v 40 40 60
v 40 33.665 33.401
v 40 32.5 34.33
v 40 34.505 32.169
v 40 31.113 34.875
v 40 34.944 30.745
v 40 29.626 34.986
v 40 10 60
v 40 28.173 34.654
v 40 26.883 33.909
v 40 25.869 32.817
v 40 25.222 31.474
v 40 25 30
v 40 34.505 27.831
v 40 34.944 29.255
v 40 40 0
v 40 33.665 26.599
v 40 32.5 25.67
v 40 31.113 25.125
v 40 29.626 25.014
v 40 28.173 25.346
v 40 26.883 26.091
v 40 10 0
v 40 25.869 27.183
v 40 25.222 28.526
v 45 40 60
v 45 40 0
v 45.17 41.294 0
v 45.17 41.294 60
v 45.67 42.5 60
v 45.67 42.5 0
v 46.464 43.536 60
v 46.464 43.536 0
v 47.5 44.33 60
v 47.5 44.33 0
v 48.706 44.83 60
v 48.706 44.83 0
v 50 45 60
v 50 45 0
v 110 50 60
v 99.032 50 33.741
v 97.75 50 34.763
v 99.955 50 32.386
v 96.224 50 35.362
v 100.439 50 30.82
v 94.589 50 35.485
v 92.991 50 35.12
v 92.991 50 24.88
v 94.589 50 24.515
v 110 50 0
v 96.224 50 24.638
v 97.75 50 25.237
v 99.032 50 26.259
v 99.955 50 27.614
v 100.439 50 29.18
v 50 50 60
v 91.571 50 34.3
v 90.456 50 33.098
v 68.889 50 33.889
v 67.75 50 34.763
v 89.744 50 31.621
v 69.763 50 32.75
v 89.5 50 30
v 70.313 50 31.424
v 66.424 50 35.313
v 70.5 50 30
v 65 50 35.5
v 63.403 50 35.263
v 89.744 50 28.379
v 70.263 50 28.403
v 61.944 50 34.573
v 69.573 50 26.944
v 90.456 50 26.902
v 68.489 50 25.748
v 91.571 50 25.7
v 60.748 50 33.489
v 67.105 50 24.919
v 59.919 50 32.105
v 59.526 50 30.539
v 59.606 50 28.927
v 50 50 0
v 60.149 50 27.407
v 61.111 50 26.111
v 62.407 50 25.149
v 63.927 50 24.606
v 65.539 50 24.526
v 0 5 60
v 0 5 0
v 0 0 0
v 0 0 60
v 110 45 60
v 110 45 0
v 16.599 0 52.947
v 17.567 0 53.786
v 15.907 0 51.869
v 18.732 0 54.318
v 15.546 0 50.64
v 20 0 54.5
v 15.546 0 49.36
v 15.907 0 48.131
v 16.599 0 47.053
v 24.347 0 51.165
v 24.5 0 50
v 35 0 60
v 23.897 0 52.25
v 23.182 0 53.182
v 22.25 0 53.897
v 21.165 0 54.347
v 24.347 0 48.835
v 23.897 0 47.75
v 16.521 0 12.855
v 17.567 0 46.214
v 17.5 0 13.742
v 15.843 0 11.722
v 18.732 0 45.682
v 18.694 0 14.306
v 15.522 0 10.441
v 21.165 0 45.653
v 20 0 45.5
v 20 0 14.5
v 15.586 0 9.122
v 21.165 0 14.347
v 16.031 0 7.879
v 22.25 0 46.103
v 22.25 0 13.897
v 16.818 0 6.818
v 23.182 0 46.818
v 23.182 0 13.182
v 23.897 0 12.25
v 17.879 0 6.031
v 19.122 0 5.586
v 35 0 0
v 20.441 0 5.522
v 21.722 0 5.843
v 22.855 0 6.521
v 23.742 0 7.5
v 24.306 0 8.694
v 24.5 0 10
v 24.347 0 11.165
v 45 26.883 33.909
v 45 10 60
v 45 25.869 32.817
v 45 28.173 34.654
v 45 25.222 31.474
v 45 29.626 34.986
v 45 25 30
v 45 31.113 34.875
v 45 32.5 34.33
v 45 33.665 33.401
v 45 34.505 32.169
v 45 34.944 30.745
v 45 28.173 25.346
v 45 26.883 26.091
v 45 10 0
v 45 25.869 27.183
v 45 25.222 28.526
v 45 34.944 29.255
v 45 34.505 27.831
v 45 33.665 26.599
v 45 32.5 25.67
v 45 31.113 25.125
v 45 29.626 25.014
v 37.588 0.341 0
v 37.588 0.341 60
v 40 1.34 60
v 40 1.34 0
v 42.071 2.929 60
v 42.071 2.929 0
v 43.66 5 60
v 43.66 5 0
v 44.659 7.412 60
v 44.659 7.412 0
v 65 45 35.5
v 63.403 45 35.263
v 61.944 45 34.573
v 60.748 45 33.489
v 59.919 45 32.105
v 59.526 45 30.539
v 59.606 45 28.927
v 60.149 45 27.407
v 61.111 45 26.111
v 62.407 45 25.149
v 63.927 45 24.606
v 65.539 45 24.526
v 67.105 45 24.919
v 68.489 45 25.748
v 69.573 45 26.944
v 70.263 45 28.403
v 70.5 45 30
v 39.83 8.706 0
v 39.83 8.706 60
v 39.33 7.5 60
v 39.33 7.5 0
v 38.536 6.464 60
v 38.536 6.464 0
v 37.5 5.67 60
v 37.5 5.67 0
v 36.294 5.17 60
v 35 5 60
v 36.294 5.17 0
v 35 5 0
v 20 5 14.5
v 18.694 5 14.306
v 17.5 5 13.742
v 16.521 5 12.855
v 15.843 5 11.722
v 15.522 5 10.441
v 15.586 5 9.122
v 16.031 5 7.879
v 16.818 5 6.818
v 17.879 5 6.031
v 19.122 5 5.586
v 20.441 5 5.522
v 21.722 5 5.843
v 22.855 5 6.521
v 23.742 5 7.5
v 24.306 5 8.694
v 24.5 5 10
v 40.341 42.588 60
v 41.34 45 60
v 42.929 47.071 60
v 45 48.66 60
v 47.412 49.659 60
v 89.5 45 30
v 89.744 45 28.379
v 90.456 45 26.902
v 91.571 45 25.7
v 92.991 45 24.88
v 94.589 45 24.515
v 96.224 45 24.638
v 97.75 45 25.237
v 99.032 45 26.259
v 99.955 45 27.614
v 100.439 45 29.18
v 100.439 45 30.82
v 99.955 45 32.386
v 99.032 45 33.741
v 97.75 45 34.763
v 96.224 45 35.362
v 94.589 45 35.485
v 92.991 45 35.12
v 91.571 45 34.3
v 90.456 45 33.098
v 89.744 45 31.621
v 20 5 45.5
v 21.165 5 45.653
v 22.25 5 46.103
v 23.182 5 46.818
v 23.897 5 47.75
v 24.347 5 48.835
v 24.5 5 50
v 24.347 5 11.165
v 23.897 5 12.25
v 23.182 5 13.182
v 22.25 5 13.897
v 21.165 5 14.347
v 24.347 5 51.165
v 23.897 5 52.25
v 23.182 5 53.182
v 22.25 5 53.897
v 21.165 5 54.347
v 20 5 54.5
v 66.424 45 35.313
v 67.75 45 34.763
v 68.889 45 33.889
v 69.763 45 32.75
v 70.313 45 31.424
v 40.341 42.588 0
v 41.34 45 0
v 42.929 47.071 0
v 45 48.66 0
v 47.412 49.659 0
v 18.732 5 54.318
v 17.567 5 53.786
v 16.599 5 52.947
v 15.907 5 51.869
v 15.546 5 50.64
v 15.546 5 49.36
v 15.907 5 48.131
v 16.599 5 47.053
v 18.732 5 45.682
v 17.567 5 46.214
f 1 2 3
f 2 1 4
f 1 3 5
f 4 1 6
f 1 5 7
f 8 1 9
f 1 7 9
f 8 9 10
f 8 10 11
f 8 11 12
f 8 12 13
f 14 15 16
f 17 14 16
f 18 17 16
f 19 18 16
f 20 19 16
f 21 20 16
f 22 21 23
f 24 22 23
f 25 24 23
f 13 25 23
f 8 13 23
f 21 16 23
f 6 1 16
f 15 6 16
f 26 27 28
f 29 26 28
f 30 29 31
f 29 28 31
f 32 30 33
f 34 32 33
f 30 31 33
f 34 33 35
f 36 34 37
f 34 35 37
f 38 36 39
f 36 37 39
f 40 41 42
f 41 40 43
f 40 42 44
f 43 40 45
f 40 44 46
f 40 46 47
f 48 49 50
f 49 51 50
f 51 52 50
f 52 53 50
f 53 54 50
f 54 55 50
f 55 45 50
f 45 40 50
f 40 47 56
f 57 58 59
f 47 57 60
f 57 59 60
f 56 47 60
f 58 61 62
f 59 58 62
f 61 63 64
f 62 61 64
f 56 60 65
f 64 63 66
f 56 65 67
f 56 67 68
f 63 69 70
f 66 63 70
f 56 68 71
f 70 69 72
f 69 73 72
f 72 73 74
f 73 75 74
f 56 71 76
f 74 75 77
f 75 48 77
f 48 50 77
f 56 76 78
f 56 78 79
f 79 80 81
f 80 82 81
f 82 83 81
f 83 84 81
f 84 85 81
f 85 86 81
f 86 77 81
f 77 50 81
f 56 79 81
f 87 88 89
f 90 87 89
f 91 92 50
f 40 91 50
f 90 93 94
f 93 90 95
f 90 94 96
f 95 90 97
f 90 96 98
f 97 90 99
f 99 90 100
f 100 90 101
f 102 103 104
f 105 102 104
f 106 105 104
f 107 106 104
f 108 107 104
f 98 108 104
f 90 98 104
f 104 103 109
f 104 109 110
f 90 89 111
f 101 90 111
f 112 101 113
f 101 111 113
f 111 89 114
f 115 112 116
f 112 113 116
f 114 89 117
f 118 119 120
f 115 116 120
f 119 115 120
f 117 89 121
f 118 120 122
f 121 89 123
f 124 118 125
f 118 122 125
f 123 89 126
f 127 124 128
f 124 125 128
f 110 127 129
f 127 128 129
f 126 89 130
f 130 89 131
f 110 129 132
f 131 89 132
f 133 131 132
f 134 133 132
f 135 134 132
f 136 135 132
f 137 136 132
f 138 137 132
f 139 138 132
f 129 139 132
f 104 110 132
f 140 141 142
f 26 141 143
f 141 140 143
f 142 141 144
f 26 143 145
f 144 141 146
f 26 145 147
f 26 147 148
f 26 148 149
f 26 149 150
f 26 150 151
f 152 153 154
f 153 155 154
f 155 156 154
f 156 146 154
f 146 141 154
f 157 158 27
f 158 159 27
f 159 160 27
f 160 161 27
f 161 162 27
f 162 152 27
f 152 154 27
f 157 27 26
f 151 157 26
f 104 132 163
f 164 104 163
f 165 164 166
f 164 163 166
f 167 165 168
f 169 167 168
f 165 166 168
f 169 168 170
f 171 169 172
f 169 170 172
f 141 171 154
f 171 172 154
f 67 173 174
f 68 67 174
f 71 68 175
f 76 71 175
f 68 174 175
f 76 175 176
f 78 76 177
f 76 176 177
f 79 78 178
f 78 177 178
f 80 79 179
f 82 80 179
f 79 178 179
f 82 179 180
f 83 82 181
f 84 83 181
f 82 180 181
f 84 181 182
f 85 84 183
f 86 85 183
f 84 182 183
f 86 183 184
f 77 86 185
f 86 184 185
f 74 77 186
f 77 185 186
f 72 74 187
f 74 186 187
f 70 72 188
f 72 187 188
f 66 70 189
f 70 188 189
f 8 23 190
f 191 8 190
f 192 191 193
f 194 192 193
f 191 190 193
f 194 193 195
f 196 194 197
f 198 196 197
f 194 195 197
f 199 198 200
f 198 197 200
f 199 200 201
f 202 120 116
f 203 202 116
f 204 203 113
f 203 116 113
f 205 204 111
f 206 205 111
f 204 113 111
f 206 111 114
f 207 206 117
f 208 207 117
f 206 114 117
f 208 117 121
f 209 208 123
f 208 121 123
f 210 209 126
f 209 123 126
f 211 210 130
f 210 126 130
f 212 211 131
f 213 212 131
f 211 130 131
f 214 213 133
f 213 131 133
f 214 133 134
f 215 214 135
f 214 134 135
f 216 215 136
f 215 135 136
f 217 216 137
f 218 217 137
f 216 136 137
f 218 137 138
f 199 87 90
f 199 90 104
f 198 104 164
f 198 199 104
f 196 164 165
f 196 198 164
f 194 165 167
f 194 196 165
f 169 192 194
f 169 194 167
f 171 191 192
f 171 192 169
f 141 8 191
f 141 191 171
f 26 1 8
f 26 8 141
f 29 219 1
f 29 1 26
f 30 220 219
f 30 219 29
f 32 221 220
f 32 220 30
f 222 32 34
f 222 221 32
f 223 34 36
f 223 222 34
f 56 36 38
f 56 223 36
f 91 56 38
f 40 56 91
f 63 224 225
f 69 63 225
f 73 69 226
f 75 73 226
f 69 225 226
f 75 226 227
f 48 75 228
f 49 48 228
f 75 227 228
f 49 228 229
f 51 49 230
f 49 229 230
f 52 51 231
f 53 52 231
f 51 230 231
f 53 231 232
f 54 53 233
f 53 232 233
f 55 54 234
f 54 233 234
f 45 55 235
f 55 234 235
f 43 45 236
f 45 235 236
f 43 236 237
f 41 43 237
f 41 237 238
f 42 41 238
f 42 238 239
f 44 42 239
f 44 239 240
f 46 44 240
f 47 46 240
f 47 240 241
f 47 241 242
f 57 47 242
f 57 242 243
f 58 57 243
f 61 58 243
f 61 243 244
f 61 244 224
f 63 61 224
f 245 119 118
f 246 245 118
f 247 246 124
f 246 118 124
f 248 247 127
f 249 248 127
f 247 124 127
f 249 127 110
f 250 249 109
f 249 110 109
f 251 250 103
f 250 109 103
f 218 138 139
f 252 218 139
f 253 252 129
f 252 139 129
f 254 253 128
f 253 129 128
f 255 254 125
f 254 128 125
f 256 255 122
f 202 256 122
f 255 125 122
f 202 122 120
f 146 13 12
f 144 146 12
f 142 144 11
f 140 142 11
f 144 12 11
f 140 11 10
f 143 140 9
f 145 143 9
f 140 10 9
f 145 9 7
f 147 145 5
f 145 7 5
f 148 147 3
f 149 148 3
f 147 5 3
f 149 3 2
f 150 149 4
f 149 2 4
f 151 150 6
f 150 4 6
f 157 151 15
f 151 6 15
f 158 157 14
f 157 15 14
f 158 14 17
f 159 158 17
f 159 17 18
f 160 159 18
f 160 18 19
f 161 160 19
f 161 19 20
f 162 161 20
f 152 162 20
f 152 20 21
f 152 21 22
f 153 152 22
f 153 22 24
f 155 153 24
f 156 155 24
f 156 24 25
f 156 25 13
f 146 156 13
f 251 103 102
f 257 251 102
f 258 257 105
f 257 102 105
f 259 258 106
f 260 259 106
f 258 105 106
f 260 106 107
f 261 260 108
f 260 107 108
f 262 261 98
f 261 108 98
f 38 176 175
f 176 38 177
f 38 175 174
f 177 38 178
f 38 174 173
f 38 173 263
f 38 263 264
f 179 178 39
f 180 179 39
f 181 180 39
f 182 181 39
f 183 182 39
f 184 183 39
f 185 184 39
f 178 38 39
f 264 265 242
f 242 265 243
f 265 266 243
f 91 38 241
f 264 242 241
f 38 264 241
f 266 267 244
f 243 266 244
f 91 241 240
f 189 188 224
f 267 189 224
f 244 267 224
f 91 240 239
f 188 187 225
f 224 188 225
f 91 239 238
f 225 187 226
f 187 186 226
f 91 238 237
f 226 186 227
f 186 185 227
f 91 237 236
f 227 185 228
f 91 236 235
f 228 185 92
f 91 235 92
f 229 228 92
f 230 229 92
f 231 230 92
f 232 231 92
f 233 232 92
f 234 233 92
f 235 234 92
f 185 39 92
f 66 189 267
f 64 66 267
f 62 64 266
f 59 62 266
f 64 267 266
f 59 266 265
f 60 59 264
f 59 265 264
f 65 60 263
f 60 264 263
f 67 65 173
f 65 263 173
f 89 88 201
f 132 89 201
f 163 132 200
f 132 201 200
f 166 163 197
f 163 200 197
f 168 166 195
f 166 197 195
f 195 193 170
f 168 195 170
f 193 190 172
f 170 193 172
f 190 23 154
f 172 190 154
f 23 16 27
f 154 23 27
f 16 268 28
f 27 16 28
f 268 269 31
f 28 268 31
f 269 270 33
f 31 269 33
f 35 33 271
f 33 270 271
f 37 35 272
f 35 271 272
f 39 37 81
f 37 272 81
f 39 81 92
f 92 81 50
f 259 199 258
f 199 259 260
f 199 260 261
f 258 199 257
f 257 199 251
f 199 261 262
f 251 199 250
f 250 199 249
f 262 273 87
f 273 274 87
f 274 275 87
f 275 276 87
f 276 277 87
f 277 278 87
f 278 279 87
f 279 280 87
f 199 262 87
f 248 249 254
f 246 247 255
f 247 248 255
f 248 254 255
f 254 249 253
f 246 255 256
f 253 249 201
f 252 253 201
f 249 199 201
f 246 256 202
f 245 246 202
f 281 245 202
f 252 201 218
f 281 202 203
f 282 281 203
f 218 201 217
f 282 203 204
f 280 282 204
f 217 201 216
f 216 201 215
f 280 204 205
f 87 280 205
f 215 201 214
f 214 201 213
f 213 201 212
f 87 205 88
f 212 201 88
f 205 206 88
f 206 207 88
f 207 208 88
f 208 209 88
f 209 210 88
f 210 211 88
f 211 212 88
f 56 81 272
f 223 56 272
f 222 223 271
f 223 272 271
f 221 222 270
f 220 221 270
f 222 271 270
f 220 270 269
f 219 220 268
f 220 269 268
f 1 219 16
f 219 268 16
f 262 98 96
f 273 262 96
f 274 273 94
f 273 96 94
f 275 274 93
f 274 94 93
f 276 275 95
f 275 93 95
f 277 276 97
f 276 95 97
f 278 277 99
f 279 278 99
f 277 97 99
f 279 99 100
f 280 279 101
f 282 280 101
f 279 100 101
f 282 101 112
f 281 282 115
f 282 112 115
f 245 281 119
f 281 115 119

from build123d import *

# Parameters (mm, degrees)
F1_DEPTH = 60
F3_DEPTH = 106.9
F5_DEPTH = 25


with BuildPart() as f1:
    # F0 (on Top) → F1 (new body)
    with BuildSketch(Plane.XY):
        with BuildLine():
            Line((0, 5), (0, 0))
            Line((0, 0), (35, 0))
            ThreePointArc((35, 0), (42.071068, 2.928932), (45, 10))
            Line((45, 10), (45, 40))
            ThreePointArc((45, 40), (46.464466, 43.535534), (50, 45))
            Line((50, 45), (110, 45))
            Line((110, 45), (110, 50))
            Line((110, 50), (50, 50))
            ThreePointArc((50, 50), (42.928932, 47.071068), (40, 40))
            Line((40, 40), (40, 10))
            ThreePointArc((40, 10), (38.535534, 6.464466), (35, 5))
            Line((35, 5), (0, 5))
        make_face()
    extrude(amount=F1_DEPTH)

    # F2 (on face) → F3 (cut)
    with BuildSketch(Plane.XZ):
        with BuildLine():
            ThreePointArc((24.5, 10), (23.181981, 13.181981), (20, 14.5))
            ThreePointArc((20, 14.5), (16.818019, 6.818019), (24.5, 10))
        make_face()
        with BuildLine():
            ThreePointArc((24.5, 50), (23.181981, 53.181981), (20, 54.5))
            Line((20, 54.5), (20, 50))
            Line((20, 50), (20, 45.5))
            ThreePointArc((20, 45.5), (23.181981, 46.818019), (24.5, 50))
        make_face()
        with BuildLine():
            Line((20, 50), (20, 54.5))
            ThreePointArc((20, 54.5), (15.5, 50), (20, 45.5))
            Line((20, 45.5), (20, 50))
        make_face()
        with BuildLine():
            ThreePointArc((100.5, 30), (95, 35.5), (89.5, 30))
            ThreePointArc((89.5, 30), (95, 24.5), (100.5, 30))
        make_face()
        with BuildLine():
            ThreePointArc((70.5, 30), (68.889087, 33.889087), (65, 35.5))
            Line((65, 35.5), (65, 30))
            Line((65, 30), (70.5, 30))
        make_face()
        with BuildLine():
            Line((65, 30), (65, 35.5))
            ThreePointArc((65, 35.5), (61.110913, 26.110913), (70.5, 30))
            Line((70.5, 30), (65, 30))
        make_face()
    extrude(amount=-F3_DEPTH, mode=Mode.SUBTRACT)

    # F4 (on face) → F5 (cut)
    with BuildSketch(Plane(origin=(40, 0, 0), x_dir=(0, -1, 0), z_dir=(-1, 0, 0))):
        with BuildLine():
            ThreePointArc((-35, 30), (-30, 25), (-25, 30))
            ThreePointArc((-25, 30), (-30, 35), (-35, 30))
        make_face()
    extrude(amount=-F5_DEPTH, mode=Mode.SUBTRACT)


solid = f1.part
